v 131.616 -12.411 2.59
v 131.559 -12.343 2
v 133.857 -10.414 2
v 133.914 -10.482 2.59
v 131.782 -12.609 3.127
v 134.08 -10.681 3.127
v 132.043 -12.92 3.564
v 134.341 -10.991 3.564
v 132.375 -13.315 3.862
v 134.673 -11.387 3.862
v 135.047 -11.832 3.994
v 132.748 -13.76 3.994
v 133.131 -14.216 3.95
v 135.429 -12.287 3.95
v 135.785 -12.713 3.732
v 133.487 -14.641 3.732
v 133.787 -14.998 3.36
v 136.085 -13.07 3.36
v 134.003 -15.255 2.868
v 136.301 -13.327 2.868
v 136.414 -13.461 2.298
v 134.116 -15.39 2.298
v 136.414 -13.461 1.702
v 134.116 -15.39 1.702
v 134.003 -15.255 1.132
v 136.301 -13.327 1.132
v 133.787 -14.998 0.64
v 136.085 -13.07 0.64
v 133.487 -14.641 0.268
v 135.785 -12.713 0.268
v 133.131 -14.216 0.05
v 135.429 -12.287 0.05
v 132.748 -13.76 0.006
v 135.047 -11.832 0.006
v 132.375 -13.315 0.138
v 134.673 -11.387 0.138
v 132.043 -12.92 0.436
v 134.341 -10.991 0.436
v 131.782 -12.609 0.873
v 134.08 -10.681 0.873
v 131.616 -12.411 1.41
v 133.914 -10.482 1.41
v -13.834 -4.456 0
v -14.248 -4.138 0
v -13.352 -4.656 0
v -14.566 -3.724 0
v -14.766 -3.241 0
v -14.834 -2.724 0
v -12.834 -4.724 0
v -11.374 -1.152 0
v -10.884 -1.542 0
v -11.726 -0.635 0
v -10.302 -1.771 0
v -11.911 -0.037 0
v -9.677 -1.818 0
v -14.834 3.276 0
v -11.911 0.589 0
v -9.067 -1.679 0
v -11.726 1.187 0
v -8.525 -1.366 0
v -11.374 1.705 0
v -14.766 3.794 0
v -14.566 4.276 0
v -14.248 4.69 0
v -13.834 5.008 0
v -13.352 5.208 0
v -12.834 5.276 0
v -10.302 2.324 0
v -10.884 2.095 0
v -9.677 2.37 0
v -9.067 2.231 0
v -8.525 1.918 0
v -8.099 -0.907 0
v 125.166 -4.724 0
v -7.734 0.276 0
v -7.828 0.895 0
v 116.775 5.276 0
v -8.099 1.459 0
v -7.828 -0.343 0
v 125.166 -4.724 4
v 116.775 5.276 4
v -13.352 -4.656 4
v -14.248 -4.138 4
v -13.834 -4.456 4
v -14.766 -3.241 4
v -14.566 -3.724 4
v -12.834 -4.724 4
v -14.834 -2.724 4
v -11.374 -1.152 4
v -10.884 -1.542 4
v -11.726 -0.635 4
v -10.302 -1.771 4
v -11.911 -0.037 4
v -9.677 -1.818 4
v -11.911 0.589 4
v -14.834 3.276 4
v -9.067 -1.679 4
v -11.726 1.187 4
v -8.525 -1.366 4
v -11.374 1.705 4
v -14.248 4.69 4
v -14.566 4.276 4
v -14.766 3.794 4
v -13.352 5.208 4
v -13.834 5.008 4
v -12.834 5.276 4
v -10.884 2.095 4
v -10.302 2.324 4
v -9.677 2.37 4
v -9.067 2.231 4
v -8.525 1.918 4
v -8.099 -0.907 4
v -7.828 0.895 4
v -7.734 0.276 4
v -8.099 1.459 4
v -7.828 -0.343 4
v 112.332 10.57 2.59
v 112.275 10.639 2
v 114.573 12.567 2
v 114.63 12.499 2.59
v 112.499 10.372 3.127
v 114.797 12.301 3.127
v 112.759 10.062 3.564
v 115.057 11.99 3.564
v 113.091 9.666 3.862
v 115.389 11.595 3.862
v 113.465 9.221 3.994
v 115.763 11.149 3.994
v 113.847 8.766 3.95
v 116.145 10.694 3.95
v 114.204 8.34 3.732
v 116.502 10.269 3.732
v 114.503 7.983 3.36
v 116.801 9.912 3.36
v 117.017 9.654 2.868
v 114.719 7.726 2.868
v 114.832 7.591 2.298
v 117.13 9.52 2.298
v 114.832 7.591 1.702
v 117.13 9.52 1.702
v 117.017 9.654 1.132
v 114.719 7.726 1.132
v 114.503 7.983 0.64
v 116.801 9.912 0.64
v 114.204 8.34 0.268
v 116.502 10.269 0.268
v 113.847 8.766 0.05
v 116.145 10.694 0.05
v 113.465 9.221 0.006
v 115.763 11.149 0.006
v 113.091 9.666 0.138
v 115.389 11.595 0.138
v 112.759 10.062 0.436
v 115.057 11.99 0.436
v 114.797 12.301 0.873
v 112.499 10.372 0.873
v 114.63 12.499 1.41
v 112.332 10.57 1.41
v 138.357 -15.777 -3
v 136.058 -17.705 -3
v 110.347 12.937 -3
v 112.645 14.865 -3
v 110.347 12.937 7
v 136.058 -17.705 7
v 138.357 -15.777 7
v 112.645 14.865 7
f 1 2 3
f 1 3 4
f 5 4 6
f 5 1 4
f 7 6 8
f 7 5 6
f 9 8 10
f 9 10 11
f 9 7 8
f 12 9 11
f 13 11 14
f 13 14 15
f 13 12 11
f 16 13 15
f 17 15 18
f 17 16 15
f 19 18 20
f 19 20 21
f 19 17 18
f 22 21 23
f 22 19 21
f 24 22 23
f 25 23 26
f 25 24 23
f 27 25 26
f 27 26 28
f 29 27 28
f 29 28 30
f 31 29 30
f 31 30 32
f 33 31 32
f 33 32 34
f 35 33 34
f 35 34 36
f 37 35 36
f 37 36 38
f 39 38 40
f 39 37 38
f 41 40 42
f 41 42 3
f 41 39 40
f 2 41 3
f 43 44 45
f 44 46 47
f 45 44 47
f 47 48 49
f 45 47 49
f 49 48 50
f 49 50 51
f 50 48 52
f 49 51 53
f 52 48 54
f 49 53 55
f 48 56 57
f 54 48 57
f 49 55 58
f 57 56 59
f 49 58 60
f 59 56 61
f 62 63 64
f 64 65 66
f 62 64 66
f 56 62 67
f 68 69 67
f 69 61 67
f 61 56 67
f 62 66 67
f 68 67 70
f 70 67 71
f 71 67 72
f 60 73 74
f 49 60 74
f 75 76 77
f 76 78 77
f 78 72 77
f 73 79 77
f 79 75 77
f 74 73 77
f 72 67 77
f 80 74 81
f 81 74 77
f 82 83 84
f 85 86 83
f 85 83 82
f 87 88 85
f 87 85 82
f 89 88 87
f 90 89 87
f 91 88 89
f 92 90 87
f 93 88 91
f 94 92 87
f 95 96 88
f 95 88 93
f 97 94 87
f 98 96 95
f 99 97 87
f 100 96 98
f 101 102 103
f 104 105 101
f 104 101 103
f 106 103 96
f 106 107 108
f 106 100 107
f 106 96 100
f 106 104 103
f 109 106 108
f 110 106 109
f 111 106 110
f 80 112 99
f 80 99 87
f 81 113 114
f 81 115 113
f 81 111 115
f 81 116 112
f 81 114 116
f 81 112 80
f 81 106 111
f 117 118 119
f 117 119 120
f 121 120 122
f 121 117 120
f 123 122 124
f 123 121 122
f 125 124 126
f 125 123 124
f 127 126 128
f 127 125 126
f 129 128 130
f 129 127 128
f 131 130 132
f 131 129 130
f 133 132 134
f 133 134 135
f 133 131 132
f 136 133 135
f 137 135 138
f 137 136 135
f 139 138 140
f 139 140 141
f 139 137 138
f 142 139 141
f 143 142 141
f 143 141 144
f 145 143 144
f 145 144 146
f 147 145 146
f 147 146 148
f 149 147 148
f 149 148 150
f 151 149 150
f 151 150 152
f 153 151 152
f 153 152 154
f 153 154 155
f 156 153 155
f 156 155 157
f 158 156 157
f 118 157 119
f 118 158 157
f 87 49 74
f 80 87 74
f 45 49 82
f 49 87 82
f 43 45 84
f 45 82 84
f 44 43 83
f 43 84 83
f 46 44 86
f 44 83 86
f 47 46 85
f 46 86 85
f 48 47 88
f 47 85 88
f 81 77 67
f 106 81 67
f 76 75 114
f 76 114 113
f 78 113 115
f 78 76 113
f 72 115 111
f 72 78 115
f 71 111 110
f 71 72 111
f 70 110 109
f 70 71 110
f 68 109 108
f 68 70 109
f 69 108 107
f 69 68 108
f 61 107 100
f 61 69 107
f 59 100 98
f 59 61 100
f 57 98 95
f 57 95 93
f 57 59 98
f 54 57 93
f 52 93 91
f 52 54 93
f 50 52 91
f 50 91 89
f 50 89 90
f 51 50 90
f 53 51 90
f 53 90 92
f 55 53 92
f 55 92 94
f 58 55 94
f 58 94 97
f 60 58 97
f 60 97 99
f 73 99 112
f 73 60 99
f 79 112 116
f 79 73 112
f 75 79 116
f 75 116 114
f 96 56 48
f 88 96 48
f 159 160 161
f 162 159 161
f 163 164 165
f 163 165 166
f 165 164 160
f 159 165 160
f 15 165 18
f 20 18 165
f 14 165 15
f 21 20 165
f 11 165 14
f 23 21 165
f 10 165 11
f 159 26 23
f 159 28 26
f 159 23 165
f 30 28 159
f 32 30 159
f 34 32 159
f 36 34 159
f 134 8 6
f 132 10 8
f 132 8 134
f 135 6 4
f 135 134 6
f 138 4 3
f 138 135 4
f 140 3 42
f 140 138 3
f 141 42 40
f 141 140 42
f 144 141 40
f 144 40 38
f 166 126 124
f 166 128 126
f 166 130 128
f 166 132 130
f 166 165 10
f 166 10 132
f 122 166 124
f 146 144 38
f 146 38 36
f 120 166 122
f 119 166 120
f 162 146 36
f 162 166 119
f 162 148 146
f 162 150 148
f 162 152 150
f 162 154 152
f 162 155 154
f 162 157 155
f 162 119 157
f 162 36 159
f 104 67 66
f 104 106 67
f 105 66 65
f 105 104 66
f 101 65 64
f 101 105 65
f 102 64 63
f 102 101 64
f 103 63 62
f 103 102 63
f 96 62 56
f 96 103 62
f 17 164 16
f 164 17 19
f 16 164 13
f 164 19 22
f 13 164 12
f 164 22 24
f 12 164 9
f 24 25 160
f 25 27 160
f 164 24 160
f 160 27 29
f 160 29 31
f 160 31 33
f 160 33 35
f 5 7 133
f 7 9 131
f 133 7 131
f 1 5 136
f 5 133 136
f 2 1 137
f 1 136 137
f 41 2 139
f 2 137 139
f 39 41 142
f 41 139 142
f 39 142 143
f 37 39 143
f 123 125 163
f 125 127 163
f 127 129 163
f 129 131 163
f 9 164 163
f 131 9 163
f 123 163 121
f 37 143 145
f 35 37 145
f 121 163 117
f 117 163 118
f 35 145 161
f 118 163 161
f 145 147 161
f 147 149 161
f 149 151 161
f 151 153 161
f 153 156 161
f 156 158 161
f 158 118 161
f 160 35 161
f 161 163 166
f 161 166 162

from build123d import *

# Parameters (mm, degrees)
SKETCH_1_R      = 2.1
EXTRUDE_1_DEPTH = 4
FILLET_1_R      = 2
SKETCH_2_W      = 10
SKETCH_2_H      = 40
SKETCH_2_R      = 2
EXTRUDE_2_DEPTH = 3


with BuildPart() as part:
    # 草图1 → 凸台-拉伸1 (new body)
    with BuildSketch(Plane.XY):
        Polygon((125.165745856, -4.723756906), (116.774749545, 5.276243094), (-14.834254144, 5.276243094), (-14.834254144, -4.723756906), align=None)
        with Locations((-9.834254144, 0.276243094)):
            Circle(SKETCH_1_R, mode=Mode.SUBTRACT)
    extrude(amount=EXTRUDE_1_DEPTH)

    # 圆角1
    fillet_1_edges = [part.edges().sort_by_distance(p)[0] for p in [
        (-14.834254144, 5.276243094, 2),
        (-14.834254144, -4.723756906, 2),
    ]]
    fillet(fillet_1_edges, radius=FILLET_1_R)


with BuildPart() as body_2:
    # 草图2 → 凸台-拉伸2 (new body)
    with BuildSketch(Plane(origin=(71.124278553, 59.680355902, 0), x_dir=(0, 0, -1), z_dir=(0.7660444431189745, 0.6427876096865437, 0))):
        with Locations((-2, -81.019525429)):
            Rectangle(SKETCH_2_W, SKETCH_2_H)
        with Locations(Location((-2, -66.019525429, 0), (0, 0, 90))):
            Circle(SKETCH_2_R, mode=Mode.SUBTRACT)
        with Locations(Location((-2, -96.019525429, 0), (0, 0, 90))):
            Circle(SKETCH_2_R, mode=Mode.SUBTRACT)
    extrude(amount=EXTRUDE_2_DEPTH)


solid = Compound([part.part, body_2.part])
